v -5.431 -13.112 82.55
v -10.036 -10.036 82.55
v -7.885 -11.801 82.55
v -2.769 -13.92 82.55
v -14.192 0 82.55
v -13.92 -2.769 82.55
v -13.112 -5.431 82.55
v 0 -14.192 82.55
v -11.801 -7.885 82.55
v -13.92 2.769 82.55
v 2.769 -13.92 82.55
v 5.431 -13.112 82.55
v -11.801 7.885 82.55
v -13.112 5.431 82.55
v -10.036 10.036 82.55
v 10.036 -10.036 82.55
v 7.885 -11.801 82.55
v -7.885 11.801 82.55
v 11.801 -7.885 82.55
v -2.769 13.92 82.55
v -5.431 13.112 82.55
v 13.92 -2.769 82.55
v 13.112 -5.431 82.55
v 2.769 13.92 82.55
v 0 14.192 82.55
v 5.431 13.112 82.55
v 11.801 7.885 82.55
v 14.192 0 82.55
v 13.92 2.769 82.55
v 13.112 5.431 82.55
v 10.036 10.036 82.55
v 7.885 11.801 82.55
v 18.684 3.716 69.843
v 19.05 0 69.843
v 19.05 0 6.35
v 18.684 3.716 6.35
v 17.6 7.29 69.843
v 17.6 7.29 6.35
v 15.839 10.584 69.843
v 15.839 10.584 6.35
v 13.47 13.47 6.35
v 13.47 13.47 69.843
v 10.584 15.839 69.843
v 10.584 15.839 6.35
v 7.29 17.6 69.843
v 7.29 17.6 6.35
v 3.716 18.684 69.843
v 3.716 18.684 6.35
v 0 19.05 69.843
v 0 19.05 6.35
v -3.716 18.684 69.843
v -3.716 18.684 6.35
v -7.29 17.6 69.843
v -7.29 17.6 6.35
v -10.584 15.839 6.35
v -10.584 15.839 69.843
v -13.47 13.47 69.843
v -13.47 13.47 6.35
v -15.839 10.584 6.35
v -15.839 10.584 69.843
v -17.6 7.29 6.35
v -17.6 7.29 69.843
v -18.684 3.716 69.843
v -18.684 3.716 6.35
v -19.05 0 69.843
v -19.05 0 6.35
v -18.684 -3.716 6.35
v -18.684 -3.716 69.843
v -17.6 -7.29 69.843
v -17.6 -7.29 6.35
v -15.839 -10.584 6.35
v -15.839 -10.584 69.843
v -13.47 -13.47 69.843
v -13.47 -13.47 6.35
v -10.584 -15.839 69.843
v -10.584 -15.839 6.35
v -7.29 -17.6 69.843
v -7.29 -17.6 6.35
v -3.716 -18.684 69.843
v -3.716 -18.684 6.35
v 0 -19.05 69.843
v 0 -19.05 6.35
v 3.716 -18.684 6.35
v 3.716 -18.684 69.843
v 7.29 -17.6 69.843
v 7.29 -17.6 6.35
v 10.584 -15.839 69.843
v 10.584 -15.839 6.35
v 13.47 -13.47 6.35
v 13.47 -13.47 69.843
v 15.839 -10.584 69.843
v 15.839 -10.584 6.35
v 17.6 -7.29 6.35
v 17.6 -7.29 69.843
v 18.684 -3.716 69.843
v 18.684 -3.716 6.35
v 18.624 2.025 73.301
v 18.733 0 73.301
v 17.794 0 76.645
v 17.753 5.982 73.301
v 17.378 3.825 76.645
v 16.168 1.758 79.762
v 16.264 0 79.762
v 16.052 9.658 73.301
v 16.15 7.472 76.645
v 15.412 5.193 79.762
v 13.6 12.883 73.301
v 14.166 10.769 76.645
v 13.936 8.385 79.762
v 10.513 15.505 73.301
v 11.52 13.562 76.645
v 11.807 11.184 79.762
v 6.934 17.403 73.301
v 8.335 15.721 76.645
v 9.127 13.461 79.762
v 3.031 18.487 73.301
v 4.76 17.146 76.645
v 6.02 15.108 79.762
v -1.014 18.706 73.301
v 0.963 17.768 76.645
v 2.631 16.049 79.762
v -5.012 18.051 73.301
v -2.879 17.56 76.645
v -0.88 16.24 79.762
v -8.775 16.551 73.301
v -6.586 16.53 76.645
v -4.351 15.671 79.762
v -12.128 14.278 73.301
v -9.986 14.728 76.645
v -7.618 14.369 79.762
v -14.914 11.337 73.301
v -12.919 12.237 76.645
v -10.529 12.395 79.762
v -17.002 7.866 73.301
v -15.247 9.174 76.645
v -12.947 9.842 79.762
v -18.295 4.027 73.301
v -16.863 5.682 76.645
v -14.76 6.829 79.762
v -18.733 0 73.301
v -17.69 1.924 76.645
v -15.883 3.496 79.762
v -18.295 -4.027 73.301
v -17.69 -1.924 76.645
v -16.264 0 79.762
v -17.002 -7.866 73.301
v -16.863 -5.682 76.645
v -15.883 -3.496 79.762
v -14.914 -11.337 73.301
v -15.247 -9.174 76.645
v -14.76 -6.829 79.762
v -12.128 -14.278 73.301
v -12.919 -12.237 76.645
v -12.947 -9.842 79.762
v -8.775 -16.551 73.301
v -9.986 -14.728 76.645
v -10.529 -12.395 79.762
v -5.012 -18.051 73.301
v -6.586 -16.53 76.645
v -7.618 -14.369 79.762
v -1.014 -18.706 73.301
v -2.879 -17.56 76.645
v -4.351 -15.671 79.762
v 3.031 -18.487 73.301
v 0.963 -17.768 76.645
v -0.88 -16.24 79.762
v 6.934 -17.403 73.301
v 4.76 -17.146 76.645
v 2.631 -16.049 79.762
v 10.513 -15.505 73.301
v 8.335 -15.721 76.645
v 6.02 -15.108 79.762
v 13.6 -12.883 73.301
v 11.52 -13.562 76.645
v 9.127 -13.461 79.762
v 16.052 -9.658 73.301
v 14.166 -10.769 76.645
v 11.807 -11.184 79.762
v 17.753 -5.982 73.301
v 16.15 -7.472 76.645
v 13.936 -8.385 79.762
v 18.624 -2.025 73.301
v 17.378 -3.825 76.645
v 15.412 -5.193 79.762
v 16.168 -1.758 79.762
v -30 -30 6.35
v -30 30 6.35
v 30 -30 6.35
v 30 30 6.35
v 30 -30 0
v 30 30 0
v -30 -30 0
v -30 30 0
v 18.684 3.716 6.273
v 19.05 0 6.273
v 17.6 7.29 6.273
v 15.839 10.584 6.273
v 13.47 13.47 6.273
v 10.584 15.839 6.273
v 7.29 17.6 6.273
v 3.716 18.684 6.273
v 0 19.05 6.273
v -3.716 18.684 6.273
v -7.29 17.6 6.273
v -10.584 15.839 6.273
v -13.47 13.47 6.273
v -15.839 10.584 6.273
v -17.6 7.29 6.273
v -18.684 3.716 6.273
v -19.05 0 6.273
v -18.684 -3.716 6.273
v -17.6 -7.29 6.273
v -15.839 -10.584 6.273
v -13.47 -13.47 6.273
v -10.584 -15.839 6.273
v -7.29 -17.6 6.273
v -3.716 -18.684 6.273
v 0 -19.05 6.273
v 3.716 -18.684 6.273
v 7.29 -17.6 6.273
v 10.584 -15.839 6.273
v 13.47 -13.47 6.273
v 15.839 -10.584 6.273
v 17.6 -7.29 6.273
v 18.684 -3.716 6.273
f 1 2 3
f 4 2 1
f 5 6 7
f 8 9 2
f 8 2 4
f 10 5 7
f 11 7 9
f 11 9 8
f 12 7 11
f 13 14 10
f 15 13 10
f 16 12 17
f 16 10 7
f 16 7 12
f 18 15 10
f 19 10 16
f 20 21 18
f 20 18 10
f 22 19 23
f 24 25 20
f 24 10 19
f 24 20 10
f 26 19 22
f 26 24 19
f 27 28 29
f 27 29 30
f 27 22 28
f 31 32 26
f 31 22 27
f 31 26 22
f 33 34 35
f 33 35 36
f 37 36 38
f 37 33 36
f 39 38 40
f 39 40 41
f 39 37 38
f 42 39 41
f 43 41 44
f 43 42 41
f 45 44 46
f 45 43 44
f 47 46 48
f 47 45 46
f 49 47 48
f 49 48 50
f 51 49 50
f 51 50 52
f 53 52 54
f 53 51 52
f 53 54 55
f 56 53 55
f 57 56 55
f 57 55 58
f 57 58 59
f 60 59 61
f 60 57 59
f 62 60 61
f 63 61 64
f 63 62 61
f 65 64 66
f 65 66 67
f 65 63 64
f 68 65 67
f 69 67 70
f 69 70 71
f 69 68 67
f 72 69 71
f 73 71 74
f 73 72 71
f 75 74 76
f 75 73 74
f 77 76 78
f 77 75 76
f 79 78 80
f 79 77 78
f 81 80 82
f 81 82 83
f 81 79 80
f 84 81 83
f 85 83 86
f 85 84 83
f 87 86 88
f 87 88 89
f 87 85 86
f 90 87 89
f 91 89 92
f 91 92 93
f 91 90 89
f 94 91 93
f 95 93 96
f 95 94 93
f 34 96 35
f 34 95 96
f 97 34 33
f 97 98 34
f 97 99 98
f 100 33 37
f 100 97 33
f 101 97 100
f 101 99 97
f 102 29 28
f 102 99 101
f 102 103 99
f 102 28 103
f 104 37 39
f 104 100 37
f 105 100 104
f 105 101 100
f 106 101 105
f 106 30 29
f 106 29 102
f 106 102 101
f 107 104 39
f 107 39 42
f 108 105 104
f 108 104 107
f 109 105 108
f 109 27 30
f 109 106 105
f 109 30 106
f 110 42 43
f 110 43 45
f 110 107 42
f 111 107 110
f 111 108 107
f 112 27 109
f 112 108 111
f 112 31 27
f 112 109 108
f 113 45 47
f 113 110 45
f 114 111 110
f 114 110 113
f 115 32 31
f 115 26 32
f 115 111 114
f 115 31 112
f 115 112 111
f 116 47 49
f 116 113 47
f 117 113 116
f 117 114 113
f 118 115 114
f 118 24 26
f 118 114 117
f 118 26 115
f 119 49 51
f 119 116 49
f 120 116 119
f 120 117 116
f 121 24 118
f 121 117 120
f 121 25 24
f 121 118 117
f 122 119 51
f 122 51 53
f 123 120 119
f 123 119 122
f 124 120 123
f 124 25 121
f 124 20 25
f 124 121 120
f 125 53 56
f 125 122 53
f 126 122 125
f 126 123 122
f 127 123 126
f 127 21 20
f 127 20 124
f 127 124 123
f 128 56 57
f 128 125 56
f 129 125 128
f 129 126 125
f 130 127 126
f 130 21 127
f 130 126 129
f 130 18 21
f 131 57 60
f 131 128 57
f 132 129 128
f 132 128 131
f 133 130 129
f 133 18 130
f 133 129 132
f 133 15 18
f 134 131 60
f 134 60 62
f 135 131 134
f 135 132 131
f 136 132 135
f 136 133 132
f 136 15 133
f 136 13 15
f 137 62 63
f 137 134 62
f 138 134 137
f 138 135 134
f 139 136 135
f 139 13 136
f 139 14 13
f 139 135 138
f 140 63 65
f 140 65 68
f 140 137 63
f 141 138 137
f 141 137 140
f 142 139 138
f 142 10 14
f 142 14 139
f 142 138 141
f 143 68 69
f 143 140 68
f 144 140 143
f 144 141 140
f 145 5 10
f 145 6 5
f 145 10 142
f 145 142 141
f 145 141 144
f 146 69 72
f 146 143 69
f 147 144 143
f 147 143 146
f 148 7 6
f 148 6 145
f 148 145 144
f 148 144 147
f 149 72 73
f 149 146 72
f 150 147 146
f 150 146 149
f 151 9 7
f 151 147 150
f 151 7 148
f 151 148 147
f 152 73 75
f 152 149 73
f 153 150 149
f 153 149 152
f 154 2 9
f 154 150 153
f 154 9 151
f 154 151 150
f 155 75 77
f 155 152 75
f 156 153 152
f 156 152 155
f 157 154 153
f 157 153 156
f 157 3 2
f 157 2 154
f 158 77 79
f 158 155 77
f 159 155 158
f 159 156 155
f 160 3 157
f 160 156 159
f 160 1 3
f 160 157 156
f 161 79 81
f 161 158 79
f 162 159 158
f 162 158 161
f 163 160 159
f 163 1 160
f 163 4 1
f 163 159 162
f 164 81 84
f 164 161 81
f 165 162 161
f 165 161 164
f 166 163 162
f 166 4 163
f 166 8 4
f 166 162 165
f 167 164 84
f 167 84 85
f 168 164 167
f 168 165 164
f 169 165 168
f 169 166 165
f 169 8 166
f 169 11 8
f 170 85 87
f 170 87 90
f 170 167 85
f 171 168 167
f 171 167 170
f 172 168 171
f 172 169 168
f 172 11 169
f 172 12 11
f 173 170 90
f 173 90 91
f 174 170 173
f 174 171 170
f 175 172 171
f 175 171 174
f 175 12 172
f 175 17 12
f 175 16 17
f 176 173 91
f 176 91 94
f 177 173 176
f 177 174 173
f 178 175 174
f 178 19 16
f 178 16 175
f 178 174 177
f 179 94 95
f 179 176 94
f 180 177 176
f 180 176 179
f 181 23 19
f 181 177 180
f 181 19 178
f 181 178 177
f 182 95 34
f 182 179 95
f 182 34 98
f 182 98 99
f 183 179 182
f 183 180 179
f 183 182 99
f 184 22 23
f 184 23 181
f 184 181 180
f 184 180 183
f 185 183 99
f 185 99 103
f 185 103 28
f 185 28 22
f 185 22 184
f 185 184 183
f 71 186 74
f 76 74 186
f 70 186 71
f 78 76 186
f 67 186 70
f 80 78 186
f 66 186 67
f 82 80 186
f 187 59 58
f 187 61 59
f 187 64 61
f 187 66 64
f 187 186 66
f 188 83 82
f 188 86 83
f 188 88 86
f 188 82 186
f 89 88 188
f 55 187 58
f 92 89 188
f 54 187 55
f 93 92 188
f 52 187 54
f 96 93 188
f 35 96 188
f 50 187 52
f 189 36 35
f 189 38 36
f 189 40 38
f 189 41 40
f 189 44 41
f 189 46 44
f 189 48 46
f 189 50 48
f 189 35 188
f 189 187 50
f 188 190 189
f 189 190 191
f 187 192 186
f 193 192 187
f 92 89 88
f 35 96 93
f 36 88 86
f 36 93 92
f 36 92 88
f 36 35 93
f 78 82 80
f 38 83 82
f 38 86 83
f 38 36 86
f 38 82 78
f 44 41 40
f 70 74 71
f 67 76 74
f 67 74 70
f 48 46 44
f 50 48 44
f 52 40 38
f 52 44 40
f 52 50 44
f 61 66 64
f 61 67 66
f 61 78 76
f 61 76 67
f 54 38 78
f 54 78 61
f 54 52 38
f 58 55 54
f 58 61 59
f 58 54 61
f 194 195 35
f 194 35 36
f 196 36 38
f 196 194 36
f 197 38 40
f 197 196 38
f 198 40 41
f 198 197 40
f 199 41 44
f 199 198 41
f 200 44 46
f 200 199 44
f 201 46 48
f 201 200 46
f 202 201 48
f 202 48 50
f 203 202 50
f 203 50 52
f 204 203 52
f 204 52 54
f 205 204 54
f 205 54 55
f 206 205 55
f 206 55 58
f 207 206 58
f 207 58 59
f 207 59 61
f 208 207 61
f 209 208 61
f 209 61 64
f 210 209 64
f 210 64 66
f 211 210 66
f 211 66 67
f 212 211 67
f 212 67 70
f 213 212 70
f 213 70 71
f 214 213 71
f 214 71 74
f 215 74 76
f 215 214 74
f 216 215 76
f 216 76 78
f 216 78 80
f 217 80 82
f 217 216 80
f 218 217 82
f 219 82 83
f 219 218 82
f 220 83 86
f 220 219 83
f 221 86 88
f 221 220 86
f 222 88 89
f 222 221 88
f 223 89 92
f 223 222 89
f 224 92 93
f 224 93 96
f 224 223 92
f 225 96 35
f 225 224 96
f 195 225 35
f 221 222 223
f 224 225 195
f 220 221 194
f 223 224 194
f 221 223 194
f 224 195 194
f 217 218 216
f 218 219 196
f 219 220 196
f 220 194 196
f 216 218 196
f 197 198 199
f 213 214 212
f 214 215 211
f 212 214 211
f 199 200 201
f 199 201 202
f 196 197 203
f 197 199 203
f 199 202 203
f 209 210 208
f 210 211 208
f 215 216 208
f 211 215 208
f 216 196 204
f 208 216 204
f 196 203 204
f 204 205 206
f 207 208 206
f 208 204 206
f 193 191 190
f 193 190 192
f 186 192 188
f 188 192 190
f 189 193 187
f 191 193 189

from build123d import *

# Parameters (mm, degrees)
F0_W     = 60
F0_H     = 60
F0_R     = 19.05
F1_DEPTH = 6.35
F2_W     = 19.05
F2_H     = 6.2725590542
F2_H_2   = 63.4925590542


with BuildPart() as f1:
    # F0 (on Top) → F1 (new body)
    with BuildSketch(Plane.XY):
        Rectangle(F0_W, F0_H)
        Circle(F0_R, mode=Mode.SUBTRACT)
    extrude(amount=F1_DEPTH)

    # F2 (on Front) → F3 (revolve)
    with BuildSketch(Plane.XZ):
        with Locations((9.525, 3.1362795271)):
            Rectangle(F2_W, F2_H)
        with Locations((9.525, 38.0962795271)):
            Rectangle(F2_W, F2_H_2)
        with BuildLine():
            Line((0, 82.55), (0, 69.8425590542))
            Line((0, 69.8425590542), (19.05, 69.8425590542))
            ThreePointArc((19.05, 69.8425590542), (17.7942013183, 76.6446836814), (14.1923727618, 82.55))
            Line((14.1923727618, 82.55), (0, 82.55))
        make_face()
    revolve(axis=Axis((0, 0, 98.337154819), (0, 0, 1)))


solid = f1.part
